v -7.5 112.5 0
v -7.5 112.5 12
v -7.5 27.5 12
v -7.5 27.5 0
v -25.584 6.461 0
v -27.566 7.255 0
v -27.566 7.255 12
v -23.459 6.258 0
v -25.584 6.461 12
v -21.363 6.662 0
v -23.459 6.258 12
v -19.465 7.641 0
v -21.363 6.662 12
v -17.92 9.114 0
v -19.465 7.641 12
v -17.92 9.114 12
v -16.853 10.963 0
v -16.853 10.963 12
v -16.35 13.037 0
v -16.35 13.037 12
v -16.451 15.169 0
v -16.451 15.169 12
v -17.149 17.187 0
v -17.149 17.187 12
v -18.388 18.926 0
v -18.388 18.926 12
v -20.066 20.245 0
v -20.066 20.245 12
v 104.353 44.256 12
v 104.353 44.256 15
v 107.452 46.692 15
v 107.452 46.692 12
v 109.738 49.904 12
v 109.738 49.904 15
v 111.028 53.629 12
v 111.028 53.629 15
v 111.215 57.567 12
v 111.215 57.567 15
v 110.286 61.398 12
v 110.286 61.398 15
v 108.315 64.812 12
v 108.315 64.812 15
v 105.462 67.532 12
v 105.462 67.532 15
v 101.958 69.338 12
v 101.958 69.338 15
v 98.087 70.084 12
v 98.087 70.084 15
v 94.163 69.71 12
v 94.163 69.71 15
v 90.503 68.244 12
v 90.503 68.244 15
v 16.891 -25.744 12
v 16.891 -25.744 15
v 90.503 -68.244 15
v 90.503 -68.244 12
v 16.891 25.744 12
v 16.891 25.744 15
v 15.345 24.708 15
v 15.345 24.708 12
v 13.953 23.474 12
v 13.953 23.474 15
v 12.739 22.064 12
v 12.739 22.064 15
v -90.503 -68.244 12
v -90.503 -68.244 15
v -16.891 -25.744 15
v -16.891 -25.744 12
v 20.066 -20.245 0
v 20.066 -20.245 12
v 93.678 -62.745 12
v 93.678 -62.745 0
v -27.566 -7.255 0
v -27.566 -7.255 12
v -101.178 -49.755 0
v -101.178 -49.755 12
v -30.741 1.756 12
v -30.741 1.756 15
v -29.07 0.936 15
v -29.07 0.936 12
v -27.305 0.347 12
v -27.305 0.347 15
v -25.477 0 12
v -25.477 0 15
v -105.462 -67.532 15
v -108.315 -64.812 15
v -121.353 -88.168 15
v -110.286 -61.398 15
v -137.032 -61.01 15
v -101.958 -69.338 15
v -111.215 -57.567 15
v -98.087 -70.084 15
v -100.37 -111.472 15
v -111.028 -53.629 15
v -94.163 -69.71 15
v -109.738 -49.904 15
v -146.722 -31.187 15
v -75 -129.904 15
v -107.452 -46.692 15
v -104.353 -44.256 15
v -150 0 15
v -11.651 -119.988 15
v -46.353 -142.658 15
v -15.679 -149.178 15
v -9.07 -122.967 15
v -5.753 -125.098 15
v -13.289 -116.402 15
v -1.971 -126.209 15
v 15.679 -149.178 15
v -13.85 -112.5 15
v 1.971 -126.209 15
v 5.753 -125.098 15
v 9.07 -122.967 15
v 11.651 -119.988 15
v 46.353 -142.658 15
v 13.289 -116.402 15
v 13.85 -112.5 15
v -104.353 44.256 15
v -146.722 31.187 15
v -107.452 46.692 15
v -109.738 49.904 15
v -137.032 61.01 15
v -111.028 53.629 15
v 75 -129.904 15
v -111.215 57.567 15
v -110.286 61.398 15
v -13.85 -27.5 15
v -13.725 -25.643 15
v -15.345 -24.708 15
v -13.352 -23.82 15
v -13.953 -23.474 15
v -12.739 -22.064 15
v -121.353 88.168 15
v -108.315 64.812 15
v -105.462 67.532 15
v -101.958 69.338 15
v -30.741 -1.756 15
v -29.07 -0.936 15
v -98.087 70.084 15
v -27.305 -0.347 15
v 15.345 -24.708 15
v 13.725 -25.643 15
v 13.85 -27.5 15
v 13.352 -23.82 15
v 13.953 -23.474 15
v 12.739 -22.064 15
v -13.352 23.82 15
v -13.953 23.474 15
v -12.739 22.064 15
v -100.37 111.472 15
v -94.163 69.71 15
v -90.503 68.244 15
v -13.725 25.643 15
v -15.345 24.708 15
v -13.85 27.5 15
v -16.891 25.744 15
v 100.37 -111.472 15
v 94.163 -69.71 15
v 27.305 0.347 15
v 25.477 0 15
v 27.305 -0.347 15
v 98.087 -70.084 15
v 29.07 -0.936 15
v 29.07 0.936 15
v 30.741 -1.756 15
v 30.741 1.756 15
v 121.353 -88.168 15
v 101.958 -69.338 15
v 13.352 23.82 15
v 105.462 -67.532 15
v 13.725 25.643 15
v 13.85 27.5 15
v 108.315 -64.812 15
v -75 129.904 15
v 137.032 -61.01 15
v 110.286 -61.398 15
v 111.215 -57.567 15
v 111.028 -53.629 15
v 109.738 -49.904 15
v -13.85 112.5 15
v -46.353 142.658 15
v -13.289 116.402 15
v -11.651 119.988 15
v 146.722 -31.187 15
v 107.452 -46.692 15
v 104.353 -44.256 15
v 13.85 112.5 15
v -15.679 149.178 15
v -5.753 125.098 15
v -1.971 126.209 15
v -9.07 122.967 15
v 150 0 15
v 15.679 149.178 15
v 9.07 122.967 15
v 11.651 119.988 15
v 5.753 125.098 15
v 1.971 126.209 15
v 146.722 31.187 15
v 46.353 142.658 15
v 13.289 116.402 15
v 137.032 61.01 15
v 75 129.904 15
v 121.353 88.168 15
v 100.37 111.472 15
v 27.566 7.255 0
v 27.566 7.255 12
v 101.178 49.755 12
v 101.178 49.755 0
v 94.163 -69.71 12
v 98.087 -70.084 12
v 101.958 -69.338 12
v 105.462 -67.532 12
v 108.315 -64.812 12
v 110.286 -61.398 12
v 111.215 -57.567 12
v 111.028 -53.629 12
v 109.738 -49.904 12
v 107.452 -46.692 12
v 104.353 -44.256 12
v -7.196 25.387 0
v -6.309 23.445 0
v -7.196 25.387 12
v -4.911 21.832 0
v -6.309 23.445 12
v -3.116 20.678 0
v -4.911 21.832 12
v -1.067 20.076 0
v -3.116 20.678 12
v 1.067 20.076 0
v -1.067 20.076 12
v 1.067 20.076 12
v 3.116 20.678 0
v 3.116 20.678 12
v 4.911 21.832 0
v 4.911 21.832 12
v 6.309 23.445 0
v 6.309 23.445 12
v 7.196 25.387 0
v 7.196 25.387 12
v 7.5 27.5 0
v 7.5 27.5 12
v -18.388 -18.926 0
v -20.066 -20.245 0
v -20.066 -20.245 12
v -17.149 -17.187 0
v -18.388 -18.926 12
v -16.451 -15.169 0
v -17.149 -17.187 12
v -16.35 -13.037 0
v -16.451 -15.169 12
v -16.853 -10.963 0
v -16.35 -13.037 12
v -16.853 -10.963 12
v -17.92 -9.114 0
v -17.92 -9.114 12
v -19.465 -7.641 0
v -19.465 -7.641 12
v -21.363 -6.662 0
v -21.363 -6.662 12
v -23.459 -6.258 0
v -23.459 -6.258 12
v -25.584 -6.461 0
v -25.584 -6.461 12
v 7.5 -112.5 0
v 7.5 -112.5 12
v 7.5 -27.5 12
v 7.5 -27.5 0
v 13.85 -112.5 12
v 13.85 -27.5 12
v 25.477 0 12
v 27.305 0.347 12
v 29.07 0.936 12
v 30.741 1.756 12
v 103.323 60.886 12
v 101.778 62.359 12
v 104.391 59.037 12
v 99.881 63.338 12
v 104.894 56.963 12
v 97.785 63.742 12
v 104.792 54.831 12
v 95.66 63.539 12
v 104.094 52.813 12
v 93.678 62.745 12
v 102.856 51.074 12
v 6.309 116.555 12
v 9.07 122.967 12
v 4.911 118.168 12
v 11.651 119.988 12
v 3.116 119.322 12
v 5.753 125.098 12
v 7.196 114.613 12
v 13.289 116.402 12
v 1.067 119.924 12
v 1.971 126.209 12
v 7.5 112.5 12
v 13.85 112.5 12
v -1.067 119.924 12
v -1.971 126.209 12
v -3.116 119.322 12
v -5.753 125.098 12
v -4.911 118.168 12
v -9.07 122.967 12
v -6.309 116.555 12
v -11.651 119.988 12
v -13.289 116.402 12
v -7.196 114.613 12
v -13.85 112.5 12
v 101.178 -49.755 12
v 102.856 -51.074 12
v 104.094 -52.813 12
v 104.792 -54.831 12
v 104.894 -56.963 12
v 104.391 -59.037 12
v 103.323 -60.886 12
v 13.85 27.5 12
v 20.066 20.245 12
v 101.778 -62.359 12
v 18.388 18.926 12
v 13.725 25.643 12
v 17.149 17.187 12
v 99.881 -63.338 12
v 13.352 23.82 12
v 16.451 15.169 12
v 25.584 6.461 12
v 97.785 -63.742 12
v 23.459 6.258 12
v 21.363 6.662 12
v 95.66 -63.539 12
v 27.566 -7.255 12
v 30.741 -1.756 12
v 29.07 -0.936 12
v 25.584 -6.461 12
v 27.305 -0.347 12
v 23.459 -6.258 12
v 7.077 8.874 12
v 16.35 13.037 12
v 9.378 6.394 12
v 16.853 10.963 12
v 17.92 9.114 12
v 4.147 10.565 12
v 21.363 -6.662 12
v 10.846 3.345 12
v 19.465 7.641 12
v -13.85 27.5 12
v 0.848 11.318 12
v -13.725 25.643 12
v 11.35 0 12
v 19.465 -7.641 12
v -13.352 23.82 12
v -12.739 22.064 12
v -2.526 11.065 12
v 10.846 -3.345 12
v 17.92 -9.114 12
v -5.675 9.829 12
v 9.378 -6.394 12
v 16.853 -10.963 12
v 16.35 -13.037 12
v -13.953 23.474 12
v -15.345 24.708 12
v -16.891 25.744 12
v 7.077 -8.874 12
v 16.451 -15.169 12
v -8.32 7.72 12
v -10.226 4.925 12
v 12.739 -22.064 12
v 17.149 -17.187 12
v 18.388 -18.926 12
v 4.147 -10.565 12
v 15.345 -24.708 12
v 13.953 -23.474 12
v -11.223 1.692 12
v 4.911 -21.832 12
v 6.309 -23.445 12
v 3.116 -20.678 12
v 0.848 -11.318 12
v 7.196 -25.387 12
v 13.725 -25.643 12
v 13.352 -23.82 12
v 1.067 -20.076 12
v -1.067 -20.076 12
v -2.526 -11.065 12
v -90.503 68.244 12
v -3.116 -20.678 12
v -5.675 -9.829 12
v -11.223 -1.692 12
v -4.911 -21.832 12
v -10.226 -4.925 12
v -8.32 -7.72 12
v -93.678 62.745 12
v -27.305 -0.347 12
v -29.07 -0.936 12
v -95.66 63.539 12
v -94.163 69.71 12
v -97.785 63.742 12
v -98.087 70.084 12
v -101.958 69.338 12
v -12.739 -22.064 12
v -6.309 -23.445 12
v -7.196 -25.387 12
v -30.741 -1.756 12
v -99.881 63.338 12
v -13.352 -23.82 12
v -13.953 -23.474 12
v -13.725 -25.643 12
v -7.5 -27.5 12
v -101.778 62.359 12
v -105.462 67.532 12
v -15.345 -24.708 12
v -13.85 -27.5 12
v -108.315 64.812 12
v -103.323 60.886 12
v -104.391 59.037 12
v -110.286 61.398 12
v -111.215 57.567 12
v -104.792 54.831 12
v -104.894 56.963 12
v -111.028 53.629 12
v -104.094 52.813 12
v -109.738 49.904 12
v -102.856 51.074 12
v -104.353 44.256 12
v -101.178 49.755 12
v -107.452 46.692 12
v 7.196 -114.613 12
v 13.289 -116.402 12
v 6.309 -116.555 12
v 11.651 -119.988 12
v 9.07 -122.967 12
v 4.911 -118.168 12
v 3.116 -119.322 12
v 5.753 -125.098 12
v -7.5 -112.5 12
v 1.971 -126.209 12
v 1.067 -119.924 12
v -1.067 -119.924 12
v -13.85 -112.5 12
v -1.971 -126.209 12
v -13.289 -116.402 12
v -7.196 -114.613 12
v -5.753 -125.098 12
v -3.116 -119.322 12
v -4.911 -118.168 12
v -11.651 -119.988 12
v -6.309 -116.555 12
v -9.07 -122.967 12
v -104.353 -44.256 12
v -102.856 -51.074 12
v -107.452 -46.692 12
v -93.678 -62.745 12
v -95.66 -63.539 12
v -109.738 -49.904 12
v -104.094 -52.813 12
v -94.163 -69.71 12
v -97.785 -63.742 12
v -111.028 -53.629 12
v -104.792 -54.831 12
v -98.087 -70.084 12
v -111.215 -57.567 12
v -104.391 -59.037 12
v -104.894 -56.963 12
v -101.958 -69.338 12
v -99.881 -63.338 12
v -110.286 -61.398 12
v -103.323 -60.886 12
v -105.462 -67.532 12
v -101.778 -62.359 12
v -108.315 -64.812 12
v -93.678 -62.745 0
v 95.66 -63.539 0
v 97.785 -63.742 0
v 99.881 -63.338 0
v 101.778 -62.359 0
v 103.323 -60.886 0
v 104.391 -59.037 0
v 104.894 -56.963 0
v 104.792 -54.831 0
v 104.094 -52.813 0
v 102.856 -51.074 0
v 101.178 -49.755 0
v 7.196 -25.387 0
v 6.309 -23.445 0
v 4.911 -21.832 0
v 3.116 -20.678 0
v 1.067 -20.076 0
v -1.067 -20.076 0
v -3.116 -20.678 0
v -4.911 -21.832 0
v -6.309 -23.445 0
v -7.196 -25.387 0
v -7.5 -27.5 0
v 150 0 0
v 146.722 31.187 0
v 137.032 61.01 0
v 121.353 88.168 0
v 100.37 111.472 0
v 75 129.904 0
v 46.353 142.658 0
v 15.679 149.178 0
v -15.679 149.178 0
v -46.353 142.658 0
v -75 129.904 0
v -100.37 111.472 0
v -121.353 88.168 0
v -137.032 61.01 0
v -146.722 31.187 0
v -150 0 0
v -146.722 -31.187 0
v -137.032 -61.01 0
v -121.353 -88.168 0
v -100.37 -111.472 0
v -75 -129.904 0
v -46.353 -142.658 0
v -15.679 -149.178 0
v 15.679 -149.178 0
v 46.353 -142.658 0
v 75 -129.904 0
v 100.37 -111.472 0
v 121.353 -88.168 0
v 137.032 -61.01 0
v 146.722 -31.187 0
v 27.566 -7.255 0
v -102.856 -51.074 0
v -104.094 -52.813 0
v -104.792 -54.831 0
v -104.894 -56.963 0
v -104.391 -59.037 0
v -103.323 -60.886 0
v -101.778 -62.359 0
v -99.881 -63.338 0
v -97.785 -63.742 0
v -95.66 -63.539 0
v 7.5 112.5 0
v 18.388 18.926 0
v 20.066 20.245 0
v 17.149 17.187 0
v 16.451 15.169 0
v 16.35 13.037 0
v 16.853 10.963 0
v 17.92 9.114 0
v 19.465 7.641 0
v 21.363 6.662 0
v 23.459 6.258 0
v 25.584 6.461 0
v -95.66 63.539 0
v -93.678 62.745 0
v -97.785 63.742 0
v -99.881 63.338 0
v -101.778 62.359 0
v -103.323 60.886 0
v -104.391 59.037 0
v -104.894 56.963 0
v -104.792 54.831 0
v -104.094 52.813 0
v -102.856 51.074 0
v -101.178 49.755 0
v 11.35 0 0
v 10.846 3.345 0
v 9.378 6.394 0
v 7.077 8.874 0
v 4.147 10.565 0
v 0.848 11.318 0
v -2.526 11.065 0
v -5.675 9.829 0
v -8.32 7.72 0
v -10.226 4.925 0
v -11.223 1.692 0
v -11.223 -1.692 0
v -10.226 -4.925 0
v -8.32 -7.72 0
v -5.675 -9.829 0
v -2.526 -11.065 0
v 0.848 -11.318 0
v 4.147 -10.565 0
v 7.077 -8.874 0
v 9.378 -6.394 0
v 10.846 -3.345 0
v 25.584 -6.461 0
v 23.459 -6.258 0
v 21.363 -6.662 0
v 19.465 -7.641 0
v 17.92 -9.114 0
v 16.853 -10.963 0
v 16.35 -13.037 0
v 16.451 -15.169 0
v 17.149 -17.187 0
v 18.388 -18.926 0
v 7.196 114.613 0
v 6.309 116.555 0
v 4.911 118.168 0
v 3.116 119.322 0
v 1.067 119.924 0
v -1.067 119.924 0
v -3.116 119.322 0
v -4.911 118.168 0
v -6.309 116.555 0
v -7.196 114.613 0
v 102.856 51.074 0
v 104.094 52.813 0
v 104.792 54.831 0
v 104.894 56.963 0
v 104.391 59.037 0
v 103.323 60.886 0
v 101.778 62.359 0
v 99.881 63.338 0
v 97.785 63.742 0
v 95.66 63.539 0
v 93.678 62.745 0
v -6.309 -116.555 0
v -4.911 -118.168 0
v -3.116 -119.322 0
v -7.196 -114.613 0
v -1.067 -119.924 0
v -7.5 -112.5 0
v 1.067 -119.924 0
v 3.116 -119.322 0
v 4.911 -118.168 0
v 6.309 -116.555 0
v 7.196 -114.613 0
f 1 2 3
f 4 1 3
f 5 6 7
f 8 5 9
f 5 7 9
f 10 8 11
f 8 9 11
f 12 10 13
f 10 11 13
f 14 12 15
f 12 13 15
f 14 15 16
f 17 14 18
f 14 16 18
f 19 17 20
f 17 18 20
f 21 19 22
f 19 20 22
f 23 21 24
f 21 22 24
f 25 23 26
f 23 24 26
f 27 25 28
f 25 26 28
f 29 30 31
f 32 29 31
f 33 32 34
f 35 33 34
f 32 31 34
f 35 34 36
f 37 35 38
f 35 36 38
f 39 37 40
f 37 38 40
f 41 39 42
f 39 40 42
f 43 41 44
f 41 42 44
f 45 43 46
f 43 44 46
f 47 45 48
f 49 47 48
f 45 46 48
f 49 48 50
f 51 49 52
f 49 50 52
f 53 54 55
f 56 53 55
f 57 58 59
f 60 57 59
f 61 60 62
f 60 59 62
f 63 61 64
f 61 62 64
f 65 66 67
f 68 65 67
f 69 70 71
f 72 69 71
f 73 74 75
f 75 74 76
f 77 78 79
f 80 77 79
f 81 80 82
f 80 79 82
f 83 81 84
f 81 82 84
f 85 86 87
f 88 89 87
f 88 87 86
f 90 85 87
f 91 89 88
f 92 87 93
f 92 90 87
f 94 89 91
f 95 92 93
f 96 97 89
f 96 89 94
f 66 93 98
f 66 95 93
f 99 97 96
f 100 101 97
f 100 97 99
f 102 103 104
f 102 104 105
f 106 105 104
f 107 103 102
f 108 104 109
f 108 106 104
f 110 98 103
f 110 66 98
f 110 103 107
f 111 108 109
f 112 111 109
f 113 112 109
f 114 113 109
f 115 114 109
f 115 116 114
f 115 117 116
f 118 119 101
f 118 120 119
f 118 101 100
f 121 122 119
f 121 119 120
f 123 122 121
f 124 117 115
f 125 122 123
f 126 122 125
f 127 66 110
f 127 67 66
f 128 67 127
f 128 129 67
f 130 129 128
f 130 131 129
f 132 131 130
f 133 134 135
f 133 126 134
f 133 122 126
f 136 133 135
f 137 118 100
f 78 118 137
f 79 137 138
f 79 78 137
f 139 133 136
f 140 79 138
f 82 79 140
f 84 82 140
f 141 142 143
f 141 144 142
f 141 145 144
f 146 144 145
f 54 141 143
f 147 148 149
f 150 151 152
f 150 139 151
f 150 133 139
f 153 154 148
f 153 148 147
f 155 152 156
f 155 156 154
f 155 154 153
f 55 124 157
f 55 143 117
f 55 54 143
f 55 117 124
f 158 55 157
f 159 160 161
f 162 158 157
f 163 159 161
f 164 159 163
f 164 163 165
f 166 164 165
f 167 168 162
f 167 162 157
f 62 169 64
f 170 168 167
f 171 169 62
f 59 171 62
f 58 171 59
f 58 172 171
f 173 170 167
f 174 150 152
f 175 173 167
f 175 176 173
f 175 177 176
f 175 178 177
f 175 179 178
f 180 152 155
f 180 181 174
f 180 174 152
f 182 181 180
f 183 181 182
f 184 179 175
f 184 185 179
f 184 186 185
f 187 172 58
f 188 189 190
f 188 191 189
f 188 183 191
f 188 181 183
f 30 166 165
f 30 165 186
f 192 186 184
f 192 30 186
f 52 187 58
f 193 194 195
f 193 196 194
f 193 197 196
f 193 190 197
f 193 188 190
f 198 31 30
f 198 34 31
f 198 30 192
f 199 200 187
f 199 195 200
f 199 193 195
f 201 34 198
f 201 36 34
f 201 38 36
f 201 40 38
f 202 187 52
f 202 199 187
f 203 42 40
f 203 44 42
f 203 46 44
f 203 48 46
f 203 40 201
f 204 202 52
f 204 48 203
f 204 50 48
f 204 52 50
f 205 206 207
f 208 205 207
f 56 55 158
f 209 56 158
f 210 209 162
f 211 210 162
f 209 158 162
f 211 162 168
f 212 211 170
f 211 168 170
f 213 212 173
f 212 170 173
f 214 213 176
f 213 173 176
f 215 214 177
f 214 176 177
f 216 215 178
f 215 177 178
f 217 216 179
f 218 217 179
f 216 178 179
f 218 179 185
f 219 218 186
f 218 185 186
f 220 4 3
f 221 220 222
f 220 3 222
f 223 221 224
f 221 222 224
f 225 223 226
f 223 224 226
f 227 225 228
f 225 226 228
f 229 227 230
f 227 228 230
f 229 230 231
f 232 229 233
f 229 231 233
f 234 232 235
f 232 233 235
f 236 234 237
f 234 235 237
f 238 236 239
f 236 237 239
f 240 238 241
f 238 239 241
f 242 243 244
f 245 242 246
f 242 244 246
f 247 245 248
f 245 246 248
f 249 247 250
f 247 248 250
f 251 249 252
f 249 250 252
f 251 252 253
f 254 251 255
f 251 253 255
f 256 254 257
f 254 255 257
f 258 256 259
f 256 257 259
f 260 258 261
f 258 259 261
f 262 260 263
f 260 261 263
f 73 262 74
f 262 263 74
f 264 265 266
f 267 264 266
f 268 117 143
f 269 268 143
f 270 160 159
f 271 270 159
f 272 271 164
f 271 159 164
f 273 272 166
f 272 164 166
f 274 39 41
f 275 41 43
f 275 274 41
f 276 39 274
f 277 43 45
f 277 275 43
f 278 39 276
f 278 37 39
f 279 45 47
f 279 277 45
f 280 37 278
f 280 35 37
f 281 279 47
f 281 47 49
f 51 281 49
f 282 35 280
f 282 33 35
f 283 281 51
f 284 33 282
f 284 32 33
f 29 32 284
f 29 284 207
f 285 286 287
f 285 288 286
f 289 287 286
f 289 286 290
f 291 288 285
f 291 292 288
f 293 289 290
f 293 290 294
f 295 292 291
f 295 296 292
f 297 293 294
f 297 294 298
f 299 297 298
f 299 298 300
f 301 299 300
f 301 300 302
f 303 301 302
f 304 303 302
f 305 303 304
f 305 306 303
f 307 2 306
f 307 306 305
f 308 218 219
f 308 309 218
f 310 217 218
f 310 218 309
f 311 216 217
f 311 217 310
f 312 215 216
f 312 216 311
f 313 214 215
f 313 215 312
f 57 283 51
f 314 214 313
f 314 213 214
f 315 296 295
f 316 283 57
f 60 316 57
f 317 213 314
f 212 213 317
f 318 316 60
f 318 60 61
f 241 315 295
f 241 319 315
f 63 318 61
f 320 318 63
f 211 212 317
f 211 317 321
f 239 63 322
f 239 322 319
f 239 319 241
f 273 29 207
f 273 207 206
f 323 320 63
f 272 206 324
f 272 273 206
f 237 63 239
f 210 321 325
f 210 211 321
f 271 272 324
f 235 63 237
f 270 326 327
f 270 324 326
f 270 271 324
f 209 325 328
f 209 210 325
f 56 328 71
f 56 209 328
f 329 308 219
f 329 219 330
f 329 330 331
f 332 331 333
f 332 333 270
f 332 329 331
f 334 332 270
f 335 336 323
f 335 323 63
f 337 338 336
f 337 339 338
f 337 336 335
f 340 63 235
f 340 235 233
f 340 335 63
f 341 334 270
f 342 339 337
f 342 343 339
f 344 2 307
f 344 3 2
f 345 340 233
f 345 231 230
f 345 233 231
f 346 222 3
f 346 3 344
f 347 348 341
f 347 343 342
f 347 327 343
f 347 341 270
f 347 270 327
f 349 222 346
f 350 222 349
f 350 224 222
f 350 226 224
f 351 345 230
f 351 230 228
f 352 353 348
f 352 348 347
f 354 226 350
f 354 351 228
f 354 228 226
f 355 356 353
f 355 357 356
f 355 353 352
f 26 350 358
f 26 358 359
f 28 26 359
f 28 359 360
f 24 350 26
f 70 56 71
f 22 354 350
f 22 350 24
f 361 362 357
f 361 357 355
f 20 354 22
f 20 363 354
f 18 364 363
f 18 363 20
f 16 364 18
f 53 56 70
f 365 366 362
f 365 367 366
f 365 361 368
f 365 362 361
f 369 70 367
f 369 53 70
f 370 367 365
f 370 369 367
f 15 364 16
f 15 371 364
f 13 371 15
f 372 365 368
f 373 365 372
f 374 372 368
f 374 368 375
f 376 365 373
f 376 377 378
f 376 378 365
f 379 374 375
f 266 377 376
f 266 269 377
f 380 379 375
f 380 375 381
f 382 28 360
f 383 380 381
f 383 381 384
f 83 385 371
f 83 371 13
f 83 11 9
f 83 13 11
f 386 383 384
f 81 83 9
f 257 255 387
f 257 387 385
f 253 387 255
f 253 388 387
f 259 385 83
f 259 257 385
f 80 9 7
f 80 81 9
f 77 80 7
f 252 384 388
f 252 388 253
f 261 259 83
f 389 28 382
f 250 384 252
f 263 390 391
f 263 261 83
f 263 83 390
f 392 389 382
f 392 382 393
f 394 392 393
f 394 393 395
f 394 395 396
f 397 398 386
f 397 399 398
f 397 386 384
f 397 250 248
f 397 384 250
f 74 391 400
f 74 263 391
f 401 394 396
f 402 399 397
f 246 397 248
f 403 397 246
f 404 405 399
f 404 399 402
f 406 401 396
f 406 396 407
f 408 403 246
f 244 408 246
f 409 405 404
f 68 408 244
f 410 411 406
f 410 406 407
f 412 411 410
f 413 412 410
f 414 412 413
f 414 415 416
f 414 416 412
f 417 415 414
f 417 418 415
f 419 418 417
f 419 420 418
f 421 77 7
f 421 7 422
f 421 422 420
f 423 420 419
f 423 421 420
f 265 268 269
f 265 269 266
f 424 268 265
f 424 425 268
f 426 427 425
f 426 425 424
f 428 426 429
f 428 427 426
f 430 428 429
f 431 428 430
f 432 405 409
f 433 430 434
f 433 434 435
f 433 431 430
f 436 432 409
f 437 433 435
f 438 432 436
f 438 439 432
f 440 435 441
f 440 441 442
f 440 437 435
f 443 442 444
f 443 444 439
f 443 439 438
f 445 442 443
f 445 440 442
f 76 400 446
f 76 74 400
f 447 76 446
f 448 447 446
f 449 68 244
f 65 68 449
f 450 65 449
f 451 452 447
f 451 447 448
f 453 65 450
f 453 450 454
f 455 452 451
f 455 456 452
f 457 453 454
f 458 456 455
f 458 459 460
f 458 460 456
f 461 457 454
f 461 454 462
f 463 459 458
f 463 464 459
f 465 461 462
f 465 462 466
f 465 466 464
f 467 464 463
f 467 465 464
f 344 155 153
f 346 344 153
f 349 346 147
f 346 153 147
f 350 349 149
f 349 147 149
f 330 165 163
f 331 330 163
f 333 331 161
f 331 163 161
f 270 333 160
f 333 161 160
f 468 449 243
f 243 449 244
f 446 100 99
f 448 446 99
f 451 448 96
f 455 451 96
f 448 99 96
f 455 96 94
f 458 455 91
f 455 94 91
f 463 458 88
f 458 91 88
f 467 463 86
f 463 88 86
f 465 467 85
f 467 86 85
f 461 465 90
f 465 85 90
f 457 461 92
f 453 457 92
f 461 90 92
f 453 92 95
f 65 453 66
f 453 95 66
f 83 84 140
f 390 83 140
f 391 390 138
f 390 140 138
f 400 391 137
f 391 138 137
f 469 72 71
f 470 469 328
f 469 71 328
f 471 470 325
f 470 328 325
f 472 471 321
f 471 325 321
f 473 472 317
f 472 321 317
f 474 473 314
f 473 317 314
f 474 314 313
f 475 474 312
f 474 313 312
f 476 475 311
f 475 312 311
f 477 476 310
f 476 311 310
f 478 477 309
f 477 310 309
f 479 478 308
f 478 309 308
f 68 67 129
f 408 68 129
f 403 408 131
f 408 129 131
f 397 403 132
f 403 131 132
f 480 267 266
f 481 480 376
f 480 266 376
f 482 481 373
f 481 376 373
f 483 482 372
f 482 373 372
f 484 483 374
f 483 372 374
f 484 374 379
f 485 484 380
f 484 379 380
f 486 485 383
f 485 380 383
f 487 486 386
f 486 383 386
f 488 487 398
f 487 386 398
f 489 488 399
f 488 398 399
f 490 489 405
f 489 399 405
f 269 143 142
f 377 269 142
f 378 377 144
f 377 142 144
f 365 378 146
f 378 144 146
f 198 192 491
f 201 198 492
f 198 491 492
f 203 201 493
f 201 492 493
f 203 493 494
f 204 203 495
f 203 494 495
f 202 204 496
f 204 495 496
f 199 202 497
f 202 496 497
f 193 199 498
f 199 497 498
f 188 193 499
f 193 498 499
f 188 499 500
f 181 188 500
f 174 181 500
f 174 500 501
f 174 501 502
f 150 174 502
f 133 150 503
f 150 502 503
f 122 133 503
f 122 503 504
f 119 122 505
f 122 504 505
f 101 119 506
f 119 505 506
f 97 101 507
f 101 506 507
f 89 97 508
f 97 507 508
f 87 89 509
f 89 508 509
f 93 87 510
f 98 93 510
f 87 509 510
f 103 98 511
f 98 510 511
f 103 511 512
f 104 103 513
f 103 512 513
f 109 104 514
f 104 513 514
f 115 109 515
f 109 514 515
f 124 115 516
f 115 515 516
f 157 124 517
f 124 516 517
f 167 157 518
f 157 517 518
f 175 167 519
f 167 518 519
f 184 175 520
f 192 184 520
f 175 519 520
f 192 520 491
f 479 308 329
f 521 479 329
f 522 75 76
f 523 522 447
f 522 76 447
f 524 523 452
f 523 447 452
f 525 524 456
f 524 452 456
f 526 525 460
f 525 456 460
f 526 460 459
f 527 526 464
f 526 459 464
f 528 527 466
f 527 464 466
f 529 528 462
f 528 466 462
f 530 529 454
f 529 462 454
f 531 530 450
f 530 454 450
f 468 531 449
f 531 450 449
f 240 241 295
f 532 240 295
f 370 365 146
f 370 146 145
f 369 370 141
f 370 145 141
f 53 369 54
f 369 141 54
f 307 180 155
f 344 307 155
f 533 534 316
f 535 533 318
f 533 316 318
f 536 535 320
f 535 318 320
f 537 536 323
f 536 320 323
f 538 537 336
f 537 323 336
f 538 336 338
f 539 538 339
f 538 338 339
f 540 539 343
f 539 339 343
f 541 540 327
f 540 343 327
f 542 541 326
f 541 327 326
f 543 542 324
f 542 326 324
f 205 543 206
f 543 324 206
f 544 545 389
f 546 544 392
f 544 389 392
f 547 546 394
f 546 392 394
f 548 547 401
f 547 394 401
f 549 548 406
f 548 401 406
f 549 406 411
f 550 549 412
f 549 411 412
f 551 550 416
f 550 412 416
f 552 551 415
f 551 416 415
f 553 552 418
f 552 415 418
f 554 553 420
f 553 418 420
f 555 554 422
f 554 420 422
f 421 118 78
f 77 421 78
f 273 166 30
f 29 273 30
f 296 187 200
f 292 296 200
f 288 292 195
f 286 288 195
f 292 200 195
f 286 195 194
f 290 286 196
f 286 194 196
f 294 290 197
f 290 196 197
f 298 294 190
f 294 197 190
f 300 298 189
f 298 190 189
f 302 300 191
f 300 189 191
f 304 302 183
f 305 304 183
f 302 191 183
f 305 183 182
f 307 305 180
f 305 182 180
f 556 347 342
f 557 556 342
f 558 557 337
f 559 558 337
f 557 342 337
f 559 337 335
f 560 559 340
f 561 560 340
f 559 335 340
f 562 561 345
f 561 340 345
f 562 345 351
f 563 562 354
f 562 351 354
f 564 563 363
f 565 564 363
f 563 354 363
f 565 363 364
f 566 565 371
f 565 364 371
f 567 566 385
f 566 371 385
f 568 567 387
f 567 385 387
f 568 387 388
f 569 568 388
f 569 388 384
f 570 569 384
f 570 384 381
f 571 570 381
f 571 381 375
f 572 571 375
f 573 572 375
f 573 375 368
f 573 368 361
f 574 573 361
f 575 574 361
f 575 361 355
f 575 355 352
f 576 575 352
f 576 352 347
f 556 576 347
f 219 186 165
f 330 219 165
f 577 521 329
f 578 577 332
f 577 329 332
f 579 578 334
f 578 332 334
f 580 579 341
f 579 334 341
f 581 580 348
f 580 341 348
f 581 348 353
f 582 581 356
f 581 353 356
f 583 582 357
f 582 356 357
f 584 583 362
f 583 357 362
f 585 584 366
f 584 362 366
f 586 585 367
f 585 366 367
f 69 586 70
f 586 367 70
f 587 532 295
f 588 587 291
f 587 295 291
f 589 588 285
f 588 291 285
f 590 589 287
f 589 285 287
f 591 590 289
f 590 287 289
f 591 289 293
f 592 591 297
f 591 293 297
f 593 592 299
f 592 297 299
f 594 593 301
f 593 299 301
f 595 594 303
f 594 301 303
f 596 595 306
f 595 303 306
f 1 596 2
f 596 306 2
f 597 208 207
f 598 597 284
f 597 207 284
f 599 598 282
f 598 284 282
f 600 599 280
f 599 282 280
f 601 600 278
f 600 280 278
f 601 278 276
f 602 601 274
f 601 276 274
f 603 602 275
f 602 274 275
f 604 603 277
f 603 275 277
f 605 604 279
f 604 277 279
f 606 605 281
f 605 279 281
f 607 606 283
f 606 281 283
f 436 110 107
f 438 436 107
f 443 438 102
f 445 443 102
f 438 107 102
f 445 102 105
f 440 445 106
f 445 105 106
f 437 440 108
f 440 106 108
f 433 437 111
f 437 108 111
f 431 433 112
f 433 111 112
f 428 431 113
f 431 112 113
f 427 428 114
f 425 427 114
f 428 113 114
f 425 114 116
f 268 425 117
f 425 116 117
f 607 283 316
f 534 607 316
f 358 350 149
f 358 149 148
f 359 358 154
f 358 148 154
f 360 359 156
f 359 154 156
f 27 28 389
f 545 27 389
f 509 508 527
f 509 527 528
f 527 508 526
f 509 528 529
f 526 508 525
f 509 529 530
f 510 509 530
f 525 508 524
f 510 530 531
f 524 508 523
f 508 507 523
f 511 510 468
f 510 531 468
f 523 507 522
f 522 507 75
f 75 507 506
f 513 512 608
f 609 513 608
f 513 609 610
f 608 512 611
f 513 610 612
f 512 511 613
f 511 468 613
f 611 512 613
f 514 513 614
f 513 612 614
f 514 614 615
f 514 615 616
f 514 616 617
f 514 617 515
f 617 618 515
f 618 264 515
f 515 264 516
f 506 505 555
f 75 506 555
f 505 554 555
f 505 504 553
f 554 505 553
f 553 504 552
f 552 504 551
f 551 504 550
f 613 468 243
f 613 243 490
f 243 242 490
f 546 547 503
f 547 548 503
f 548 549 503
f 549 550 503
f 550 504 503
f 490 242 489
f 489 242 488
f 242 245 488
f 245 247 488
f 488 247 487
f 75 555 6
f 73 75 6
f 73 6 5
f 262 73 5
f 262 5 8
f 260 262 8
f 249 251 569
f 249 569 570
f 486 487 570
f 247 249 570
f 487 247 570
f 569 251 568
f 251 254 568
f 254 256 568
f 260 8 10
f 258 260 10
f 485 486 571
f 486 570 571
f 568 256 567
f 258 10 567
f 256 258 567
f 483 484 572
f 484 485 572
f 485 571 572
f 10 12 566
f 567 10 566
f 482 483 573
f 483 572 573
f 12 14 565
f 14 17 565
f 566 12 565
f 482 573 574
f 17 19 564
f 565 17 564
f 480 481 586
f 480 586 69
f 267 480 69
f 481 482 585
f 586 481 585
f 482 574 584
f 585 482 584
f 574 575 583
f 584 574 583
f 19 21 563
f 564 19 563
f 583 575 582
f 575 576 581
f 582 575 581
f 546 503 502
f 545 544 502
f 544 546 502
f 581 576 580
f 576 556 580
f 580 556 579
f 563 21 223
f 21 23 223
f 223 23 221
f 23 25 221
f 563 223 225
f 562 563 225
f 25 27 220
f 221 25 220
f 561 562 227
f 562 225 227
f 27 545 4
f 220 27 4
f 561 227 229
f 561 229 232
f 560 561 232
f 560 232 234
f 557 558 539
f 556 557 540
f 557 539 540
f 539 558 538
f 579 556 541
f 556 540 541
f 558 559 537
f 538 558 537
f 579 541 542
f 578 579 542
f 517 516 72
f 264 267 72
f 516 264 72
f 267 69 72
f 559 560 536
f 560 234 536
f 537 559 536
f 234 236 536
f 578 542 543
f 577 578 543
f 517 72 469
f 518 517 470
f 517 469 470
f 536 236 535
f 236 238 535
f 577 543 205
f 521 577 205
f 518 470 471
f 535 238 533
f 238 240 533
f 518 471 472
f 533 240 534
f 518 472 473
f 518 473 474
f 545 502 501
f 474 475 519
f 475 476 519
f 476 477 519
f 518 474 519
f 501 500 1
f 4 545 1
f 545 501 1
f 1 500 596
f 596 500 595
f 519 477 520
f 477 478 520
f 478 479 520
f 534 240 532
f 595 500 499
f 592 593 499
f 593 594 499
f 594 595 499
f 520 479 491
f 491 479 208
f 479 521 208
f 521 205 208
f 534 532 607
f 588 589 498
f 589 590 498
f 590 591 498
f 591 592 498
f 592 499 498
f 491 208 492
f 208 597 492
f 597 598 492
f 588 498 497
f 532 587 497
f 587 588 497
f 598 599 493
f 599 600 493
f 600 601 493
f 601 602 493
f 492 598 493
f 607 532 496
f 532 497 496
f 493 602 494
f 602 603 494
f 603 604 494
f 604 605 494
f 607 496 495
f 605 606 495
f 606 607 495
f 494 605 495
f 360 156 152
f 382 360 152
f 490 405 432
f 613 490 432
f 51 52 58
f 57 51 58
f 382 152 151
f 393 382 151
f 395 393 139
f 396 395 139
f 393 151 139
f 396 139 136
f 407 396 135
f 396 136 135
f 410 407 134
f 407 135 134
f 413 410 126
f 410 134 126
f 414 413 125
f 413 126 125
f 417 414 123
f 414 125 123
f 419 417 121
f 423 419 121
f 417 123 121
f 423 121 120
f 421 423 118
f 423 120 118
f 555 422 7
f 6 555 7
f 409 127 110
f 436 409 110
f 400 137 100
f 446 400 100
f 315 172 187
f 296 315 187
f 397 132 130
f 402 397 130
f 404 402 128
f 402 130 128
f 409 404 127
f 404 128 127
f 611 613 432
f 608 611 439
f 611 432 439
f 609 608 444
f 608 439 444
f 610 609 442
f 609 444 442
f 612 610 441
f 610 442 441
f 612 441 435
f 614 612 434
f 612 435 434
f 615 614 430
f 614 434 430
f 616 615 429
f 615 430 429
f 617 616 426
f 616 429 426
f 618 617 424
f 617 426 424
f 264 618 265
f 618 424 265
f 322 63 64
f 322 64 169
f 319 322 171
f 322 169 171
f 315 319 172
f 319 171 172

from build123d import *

# Parameters (mm, degrees)
F0_R            = 150
F1_DEPTH        = 15
F3_DEPTH        = 15.001
F3_COPIES_COUNT = 6
F5_DEPTH        = 3
F5_COPIES_COUNT = 6
F6_R            = 25
F6_R_2          = 11.35
F7_DEPTH        = 3
F8_DEPTH        = 15.001


# Not quite as in the source:
# - an extrude ends at something that could not be found from the text; its depth is read off the source's solid
# - a pattern or mirror of a feature is missing from the dataset's text; its kind, count and spacing are read off the source's solid


with BuildPart() as f1:
    # F0 (on Top) → F1 (new body)
    with BuildSketch(Plane.XY):
        Circle(F0_R)
    extrude(amount=F1_DEPTH)

    # F2 (on face) → F3 (cut, through all)
    with BuildSketch(Plane.XY.offset(15)):
        with BuildLine():
            ThreePointArc((0, 120), (-5.3033008589, 117.8033008589), (-7.5, 112.5))
            Line((-7.5, 112.5), (-7.5, 27.5))
            ThreePointArc((-7.5, 27.5), (-5.3033008589, 22.1966991411), (0, 20))
            Line((0, 20), (0, 120))
        make_face()
        with BuildLine():
            ThreePointArc((7.5, 112.5), (5.3033008589, 117.8033008589), (0, 120))
            Line((0, 120), (0, 20))
            ThreePointArc((0, 20), (5.3033008589, 22.1966991411), (7.5, 27.5))
            Line((7.5, 27.5), (7.5, 112.5))
        make_face()
    f3 = extrude(amount=-F3_DEPTH, mode=Mode.SUBTRACT)

    # F3_copies: F3 ×6 about axis
    f3_copies_axis = Axis((0, 0, 0), (0, 0, 1))
    for i in range(1, F3_COPIES_COUNT):
        add(f3.rotate(f3_copies_axis, i * 360 / F3_COPIES_COUNT), mode=Mode.SUBTRACT)

    # F4 (on face) → F5 (cut)
    with BuildSketch(Plane.XY.offset(15)):
        with BuildLine():
            Line((13.85, 27.5), (13.85, 112.5))
            ThreePointArc((13.85, 112.5), (0, 126.35), (-13.85, 112.5))
            Line((-13.85, 112.5), (-13.85, 27.5))
            ThreePointArc((-13.85, 27.5), (0, 13.65), (13.85, 27.5))
        make_face()
        with BuildLine():
            Line((7.5, 112.5), (7.5, 27.5))
            ThreePointArc((7.5, 27.5), (0, 20), (-7.5, 27.5))
            Line((-7.5, 27.5), (-7.5, 112.5))
            ThreePointArc((-7.5, 112.5), (0, 120), (7.5, 112.5))
        make_face(mode=Mode.SUBTRACT)
    f5 = extrude(amount=-F5_DEPTH, mode=Mode.SUBTRACT)

    # F5_copies: F5 ×6 about axis
    f5_copies_axis = Axis((0, 0, 0), (0, 0, 1))
    for i in range(1, F5_COPIES_COUNT):
        add(f5.rotate(f5_copies_axis, i * 360 / F5_COPIES_COUNT), mode=Mode.SUBTRACT)

    # F6 (on face) → F7 (cut, through all)
    with BuildSketch(Plane.XY.offset(15)):
        Circle(F6_R)
        with BuildLine():
            ThreePointArc((11.0771869157, 19.186250543), (11.8212467617, 6.825), (22.1543738315, 0))
            ThreePointArc((22.1543738315, 0), (11.8212467617, -6.825), (11.0771869157, -19.186250543))
            ThreePointArc((11.0771869157, -19.186250543), (0, -13.65), (-11.0771869157, -19.186250543))
            ThreePointArc((-11.0771869157, -19.186250543), (-11.8212467617, -6.825), (-22.1543738315, 0))
            ThreePointArc((-22.1543738315, 0), (-11.8212467617, 6.825), (-11.0771869157, 19.186250543))
            ThreePointArc((-11.0771869157, 19.186250543), (0, 13.65), (11.0771869157, 19.186250543))
        make_face(mode=Mode.SUBTRACT)
        with BuildLine():
            ThreePointArc((11.0771869157, -19.186250543), (11.8212467617, -6.825), (22.1543738315, 0))
            ThreePointArc((22.1543738315, 0), (11.8212467617, 6.825), (11.0771869157, 19.186250543))
            ThreePointArc((11.0771869157, 19.186250543), (0, 13.65), (-11.0771869157, 19.186250543))
            ThreePointArc((-11.0771869157, 19.186250543), (-11.8212467617, 6.825), (-22.1543738315, 0))
            ThreePointArc((-22.1543738315, 0), (-11.8212467617, -6.825), (-11.0771869157, -19.186250543))
            ThreePointArc((-11.0771869157, -19.186250543), (0, -13.65), (11.0771869157, -19.186250543))
        make_face()
        Circle(F6_R_2, mode=Mode.SUBTRACT)
        Circle(F6_R_2)
    extrude(amount=-F7_DEPTH, mode=Mode.SUBTRACT)

    # F6 (on face) → F8 (cut, through all)
    with BuildSketch(Plane.XY.offset(15)):
        Circle(F6_R_2)
    extrude(amount=-F8_DEPTH, mode=Mode.SUBTRACT)


solid = f1.part
